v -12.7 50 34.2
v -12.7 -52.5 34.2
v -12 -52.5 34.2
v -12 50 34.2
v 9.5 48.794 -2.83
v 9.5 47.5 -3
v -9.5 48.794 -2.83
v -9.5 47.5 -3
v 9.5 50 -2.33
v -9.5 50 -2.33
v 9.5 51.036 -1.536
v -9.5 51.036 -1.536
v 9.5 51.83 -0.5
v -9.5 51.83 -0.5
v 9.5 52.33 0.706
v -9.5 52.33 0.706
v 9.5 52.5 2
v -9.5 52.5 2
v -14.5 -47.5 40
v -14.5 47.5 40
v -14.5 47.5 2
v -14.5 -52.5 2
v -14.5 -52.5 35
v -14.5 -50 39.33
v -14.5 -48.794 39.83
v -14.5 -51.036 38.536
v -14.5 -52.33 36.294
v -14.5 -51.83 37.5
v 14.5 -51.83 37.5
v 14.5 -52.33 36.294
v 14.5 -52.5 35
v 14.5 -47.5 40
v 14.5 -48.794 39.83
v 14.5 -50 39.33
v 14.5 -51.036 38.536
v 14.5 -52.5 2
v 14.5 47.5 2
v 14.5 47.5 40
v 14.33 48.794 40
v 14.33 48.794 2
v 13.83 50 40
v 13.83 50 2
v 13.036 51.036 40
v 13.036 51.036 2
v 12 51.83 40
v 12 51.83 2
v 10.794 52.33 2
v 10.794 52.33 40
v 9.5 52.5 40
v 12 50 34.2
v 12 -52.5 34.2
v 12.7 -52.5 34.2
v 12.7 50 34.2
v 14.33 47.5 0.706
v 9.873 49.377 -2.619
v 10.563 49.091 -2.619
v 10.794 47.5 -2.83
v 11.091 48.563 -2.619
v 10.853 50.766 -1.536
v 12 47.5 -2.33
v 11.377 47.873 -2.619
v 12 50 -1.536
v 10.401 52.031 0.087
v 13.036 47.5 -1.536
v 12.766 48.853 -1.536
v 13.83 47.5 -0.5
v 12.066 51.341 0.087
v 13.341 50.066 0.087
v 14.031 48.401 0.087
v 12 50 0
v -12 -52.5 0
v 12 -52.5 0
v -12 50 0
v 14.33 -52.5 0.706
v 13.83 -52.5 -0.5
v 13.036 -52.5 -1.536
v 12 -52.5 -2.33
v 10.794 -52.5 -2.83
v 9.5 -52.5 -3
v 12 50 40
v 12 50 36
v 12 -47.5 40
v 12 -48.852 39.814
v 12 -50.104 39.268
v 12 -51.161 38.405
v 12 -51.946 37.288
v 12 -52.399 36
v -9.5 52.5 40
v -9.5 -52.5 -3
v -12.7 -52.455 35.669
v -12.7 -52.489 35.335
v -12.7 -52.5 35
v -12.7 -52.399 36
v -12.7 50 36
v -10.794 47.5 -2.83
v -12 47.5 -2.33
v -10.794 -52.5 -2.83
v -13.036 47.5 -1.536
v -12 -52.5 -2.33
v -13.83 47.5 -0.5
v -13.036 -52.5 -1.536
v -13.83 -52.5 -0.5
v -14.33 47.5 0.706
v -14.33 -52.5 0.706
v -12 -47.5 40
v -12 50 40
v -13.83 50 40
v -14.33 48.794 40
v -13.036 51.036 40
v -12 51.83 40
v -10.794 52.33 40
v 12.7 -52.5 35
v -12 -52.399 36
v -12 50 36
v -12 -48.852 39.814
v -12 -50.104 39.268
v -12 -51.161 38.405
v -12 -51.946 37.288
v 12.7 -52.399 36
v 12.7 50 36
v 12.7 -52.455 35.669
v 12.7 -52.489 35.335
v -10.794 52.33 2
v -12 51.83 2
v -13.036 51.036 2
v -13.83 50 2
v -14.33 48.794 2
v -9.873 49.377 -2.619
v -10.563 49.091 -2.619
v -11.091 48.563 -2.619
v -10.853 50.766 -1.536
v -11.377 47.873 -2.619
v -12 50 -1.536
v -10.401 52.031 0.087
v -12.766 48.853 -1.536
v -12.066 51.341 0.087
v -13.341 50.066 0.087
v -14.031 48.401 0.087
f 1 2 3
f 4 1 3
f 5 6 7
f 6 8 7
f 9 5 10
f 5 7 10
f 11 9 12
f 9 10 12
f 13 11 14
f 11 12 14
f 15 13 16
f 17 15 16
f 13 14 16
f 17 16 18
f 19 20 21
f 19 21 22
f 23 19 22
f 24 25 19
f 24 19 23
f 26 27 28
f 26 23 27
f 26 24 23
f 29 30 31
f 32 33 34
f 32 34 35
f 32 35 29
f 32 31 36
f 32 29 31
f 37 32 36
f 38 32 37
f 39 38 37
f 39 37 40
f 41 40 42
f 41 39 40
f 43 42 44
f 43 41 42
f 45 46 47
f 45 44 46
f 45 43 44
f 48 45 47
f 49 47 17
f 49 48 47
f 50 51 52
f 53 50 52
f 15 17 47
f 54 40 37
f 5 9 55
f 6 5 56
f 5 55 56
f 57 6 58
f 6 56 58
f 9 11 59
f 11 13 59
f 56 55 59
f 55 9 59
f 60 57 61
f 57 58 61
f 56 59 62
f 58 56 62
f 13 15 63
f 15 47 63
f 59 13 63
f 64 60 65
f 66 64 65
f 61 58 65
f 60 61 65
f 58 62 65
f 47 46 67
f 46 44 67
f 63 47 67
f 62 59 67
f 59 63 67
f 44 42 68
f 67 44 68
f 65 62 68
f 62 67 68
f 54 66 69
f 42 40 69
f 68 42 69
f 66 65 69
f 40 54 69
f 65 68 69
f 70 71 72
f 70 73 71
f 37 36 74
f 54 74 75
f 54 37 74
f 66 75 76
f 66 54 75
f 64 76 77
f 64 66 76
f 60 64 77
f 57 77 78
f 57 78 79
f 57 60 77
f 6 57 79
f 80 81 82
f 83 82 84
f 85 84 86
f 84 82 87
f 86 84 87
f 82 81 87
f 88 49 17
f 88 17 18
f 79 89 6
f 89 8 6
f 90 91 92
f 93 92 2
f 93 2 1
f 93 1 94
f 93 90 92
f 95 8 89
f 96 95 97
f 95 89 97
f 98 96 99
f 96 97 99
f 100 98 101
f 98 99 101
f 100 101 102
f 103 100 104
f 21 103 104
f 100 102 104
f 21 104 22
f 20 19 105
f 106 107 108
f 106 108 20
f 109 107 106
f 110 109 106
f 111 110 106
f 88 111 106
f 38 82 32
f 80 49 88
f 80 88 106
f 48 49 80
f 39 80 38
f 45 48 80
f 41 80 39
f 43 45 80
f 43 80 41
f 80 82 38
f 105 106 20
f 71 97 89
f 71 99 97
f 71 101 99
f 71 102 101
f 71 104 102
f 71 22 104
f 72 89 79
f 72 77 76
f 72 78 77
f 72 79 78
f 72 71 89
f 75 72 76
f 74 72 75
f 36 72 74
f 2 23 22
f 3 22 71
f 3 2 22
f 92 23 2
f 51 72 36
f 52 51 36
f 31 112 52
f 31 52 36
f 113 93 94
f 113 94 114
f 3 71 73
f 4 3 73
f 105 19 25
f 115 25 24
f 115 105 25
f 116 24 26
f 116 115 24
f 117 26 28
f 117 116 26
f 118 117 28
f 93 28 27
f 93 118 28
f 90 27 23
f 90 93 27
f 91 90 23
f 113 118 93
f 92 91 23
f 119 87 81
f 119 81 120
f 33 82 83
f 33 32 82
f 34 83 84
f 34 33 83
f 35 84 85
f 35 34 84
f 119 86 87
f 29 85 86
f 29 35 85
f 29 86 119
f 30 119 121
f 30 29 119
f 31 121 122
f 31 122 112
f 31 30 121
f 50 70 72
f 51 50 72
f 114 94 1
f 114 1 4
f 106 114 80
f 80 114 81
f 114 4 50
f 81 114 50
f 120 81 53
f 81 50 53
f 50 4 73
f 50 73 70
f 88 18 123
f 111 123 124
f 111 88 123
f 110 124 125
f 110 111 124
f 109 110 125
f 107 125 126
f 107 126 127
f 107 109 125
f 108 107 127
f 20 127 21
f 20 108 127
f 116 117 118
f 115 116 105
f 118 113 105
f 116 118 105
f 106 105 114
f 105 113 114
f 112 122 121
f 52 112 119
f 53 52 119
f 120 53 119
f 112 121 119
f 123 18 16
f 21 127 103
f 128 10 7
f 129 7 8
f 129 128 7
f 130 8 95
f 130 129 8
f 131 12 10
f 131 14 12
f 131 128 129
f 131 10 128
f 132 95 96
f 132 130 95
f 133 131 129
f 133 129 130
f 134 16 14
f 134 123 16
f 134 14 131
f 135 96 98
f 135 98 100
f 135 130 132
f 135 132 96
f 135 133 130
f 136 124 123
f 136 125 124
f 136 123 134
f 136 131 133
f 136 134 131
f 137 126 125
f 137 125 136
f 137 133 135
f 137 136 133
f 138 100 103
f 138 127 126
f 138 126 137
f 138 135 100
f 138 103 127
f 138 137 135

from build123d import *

# Parameters (mm, degrees)
F1_DEPTH = 40
F0_W     = 24
F0_H     = 100
F0_H_2   = 2.5
F2_DEPTH = 3
F3_W     = 0.7
F3_H     = 1.8
F4_DEPTH = 102.5
F5_R     = 5


with BuildPart() as f1:
    # F0 (on Top) → F1 (new body)
    with BuildSketch(Plane.XY):
        Polygon((12, 50), (12, -50), (12, -52.5), (14.5, -52.5), (14.5, 52.5), (-14.5, 52.5), (-14.5, -52.5), (-12, -52.5), (-12, -50), (-12, 50), align=None)
    extrude(amount=F1_DEPTH)

    # F0 (on Top) → F2 (join)
    with BuildSketch(Plane.XY):
        Rectangle(F0_W, F0_H)
        Polygon((12, 50), (12, -50), (12, -52.5), (14.5, -52.5), (14.5, 52.5), (-14.5, 52.5), (-14.5, -52.5), (-12, -52.5), (-12, -50), (-12, 50), align=None)
        with Locations((0, -51.25)):
            Rectangle(F0_W, F0_H_2)
    extrude(amount=-F2_DEPTH)

    # F3 (on face) → F4 (cut)
    with BuildSketch(Plane.XZ.offset(52.5)):
        with Locations((-12.35, 35.1)):
            Rectangle(F3_W, F3_H)
        with Locations((12.35, 35.1)):
            Rectangle(F3_W, F3_H)
    extrude(amount=-F4_DEPTH, mode=Mode.SUBTRACT)

    # F5
    f5_edges = [f1.edges().sort_by_distance(p)[0] for p in [
        (-13.25, -52.5, 40),
        (13.25, -52.5, 40),
        (-14.5, 52.5, 18.5),
        (14.5, 52.5, 18.5),
        (0, 52.5, -3),
        (14.5, 0, -3),
        (-14.5, 0, -3),
    ]]
    fillet(f5_edges, radius=F5_R)


solid = f1.part
